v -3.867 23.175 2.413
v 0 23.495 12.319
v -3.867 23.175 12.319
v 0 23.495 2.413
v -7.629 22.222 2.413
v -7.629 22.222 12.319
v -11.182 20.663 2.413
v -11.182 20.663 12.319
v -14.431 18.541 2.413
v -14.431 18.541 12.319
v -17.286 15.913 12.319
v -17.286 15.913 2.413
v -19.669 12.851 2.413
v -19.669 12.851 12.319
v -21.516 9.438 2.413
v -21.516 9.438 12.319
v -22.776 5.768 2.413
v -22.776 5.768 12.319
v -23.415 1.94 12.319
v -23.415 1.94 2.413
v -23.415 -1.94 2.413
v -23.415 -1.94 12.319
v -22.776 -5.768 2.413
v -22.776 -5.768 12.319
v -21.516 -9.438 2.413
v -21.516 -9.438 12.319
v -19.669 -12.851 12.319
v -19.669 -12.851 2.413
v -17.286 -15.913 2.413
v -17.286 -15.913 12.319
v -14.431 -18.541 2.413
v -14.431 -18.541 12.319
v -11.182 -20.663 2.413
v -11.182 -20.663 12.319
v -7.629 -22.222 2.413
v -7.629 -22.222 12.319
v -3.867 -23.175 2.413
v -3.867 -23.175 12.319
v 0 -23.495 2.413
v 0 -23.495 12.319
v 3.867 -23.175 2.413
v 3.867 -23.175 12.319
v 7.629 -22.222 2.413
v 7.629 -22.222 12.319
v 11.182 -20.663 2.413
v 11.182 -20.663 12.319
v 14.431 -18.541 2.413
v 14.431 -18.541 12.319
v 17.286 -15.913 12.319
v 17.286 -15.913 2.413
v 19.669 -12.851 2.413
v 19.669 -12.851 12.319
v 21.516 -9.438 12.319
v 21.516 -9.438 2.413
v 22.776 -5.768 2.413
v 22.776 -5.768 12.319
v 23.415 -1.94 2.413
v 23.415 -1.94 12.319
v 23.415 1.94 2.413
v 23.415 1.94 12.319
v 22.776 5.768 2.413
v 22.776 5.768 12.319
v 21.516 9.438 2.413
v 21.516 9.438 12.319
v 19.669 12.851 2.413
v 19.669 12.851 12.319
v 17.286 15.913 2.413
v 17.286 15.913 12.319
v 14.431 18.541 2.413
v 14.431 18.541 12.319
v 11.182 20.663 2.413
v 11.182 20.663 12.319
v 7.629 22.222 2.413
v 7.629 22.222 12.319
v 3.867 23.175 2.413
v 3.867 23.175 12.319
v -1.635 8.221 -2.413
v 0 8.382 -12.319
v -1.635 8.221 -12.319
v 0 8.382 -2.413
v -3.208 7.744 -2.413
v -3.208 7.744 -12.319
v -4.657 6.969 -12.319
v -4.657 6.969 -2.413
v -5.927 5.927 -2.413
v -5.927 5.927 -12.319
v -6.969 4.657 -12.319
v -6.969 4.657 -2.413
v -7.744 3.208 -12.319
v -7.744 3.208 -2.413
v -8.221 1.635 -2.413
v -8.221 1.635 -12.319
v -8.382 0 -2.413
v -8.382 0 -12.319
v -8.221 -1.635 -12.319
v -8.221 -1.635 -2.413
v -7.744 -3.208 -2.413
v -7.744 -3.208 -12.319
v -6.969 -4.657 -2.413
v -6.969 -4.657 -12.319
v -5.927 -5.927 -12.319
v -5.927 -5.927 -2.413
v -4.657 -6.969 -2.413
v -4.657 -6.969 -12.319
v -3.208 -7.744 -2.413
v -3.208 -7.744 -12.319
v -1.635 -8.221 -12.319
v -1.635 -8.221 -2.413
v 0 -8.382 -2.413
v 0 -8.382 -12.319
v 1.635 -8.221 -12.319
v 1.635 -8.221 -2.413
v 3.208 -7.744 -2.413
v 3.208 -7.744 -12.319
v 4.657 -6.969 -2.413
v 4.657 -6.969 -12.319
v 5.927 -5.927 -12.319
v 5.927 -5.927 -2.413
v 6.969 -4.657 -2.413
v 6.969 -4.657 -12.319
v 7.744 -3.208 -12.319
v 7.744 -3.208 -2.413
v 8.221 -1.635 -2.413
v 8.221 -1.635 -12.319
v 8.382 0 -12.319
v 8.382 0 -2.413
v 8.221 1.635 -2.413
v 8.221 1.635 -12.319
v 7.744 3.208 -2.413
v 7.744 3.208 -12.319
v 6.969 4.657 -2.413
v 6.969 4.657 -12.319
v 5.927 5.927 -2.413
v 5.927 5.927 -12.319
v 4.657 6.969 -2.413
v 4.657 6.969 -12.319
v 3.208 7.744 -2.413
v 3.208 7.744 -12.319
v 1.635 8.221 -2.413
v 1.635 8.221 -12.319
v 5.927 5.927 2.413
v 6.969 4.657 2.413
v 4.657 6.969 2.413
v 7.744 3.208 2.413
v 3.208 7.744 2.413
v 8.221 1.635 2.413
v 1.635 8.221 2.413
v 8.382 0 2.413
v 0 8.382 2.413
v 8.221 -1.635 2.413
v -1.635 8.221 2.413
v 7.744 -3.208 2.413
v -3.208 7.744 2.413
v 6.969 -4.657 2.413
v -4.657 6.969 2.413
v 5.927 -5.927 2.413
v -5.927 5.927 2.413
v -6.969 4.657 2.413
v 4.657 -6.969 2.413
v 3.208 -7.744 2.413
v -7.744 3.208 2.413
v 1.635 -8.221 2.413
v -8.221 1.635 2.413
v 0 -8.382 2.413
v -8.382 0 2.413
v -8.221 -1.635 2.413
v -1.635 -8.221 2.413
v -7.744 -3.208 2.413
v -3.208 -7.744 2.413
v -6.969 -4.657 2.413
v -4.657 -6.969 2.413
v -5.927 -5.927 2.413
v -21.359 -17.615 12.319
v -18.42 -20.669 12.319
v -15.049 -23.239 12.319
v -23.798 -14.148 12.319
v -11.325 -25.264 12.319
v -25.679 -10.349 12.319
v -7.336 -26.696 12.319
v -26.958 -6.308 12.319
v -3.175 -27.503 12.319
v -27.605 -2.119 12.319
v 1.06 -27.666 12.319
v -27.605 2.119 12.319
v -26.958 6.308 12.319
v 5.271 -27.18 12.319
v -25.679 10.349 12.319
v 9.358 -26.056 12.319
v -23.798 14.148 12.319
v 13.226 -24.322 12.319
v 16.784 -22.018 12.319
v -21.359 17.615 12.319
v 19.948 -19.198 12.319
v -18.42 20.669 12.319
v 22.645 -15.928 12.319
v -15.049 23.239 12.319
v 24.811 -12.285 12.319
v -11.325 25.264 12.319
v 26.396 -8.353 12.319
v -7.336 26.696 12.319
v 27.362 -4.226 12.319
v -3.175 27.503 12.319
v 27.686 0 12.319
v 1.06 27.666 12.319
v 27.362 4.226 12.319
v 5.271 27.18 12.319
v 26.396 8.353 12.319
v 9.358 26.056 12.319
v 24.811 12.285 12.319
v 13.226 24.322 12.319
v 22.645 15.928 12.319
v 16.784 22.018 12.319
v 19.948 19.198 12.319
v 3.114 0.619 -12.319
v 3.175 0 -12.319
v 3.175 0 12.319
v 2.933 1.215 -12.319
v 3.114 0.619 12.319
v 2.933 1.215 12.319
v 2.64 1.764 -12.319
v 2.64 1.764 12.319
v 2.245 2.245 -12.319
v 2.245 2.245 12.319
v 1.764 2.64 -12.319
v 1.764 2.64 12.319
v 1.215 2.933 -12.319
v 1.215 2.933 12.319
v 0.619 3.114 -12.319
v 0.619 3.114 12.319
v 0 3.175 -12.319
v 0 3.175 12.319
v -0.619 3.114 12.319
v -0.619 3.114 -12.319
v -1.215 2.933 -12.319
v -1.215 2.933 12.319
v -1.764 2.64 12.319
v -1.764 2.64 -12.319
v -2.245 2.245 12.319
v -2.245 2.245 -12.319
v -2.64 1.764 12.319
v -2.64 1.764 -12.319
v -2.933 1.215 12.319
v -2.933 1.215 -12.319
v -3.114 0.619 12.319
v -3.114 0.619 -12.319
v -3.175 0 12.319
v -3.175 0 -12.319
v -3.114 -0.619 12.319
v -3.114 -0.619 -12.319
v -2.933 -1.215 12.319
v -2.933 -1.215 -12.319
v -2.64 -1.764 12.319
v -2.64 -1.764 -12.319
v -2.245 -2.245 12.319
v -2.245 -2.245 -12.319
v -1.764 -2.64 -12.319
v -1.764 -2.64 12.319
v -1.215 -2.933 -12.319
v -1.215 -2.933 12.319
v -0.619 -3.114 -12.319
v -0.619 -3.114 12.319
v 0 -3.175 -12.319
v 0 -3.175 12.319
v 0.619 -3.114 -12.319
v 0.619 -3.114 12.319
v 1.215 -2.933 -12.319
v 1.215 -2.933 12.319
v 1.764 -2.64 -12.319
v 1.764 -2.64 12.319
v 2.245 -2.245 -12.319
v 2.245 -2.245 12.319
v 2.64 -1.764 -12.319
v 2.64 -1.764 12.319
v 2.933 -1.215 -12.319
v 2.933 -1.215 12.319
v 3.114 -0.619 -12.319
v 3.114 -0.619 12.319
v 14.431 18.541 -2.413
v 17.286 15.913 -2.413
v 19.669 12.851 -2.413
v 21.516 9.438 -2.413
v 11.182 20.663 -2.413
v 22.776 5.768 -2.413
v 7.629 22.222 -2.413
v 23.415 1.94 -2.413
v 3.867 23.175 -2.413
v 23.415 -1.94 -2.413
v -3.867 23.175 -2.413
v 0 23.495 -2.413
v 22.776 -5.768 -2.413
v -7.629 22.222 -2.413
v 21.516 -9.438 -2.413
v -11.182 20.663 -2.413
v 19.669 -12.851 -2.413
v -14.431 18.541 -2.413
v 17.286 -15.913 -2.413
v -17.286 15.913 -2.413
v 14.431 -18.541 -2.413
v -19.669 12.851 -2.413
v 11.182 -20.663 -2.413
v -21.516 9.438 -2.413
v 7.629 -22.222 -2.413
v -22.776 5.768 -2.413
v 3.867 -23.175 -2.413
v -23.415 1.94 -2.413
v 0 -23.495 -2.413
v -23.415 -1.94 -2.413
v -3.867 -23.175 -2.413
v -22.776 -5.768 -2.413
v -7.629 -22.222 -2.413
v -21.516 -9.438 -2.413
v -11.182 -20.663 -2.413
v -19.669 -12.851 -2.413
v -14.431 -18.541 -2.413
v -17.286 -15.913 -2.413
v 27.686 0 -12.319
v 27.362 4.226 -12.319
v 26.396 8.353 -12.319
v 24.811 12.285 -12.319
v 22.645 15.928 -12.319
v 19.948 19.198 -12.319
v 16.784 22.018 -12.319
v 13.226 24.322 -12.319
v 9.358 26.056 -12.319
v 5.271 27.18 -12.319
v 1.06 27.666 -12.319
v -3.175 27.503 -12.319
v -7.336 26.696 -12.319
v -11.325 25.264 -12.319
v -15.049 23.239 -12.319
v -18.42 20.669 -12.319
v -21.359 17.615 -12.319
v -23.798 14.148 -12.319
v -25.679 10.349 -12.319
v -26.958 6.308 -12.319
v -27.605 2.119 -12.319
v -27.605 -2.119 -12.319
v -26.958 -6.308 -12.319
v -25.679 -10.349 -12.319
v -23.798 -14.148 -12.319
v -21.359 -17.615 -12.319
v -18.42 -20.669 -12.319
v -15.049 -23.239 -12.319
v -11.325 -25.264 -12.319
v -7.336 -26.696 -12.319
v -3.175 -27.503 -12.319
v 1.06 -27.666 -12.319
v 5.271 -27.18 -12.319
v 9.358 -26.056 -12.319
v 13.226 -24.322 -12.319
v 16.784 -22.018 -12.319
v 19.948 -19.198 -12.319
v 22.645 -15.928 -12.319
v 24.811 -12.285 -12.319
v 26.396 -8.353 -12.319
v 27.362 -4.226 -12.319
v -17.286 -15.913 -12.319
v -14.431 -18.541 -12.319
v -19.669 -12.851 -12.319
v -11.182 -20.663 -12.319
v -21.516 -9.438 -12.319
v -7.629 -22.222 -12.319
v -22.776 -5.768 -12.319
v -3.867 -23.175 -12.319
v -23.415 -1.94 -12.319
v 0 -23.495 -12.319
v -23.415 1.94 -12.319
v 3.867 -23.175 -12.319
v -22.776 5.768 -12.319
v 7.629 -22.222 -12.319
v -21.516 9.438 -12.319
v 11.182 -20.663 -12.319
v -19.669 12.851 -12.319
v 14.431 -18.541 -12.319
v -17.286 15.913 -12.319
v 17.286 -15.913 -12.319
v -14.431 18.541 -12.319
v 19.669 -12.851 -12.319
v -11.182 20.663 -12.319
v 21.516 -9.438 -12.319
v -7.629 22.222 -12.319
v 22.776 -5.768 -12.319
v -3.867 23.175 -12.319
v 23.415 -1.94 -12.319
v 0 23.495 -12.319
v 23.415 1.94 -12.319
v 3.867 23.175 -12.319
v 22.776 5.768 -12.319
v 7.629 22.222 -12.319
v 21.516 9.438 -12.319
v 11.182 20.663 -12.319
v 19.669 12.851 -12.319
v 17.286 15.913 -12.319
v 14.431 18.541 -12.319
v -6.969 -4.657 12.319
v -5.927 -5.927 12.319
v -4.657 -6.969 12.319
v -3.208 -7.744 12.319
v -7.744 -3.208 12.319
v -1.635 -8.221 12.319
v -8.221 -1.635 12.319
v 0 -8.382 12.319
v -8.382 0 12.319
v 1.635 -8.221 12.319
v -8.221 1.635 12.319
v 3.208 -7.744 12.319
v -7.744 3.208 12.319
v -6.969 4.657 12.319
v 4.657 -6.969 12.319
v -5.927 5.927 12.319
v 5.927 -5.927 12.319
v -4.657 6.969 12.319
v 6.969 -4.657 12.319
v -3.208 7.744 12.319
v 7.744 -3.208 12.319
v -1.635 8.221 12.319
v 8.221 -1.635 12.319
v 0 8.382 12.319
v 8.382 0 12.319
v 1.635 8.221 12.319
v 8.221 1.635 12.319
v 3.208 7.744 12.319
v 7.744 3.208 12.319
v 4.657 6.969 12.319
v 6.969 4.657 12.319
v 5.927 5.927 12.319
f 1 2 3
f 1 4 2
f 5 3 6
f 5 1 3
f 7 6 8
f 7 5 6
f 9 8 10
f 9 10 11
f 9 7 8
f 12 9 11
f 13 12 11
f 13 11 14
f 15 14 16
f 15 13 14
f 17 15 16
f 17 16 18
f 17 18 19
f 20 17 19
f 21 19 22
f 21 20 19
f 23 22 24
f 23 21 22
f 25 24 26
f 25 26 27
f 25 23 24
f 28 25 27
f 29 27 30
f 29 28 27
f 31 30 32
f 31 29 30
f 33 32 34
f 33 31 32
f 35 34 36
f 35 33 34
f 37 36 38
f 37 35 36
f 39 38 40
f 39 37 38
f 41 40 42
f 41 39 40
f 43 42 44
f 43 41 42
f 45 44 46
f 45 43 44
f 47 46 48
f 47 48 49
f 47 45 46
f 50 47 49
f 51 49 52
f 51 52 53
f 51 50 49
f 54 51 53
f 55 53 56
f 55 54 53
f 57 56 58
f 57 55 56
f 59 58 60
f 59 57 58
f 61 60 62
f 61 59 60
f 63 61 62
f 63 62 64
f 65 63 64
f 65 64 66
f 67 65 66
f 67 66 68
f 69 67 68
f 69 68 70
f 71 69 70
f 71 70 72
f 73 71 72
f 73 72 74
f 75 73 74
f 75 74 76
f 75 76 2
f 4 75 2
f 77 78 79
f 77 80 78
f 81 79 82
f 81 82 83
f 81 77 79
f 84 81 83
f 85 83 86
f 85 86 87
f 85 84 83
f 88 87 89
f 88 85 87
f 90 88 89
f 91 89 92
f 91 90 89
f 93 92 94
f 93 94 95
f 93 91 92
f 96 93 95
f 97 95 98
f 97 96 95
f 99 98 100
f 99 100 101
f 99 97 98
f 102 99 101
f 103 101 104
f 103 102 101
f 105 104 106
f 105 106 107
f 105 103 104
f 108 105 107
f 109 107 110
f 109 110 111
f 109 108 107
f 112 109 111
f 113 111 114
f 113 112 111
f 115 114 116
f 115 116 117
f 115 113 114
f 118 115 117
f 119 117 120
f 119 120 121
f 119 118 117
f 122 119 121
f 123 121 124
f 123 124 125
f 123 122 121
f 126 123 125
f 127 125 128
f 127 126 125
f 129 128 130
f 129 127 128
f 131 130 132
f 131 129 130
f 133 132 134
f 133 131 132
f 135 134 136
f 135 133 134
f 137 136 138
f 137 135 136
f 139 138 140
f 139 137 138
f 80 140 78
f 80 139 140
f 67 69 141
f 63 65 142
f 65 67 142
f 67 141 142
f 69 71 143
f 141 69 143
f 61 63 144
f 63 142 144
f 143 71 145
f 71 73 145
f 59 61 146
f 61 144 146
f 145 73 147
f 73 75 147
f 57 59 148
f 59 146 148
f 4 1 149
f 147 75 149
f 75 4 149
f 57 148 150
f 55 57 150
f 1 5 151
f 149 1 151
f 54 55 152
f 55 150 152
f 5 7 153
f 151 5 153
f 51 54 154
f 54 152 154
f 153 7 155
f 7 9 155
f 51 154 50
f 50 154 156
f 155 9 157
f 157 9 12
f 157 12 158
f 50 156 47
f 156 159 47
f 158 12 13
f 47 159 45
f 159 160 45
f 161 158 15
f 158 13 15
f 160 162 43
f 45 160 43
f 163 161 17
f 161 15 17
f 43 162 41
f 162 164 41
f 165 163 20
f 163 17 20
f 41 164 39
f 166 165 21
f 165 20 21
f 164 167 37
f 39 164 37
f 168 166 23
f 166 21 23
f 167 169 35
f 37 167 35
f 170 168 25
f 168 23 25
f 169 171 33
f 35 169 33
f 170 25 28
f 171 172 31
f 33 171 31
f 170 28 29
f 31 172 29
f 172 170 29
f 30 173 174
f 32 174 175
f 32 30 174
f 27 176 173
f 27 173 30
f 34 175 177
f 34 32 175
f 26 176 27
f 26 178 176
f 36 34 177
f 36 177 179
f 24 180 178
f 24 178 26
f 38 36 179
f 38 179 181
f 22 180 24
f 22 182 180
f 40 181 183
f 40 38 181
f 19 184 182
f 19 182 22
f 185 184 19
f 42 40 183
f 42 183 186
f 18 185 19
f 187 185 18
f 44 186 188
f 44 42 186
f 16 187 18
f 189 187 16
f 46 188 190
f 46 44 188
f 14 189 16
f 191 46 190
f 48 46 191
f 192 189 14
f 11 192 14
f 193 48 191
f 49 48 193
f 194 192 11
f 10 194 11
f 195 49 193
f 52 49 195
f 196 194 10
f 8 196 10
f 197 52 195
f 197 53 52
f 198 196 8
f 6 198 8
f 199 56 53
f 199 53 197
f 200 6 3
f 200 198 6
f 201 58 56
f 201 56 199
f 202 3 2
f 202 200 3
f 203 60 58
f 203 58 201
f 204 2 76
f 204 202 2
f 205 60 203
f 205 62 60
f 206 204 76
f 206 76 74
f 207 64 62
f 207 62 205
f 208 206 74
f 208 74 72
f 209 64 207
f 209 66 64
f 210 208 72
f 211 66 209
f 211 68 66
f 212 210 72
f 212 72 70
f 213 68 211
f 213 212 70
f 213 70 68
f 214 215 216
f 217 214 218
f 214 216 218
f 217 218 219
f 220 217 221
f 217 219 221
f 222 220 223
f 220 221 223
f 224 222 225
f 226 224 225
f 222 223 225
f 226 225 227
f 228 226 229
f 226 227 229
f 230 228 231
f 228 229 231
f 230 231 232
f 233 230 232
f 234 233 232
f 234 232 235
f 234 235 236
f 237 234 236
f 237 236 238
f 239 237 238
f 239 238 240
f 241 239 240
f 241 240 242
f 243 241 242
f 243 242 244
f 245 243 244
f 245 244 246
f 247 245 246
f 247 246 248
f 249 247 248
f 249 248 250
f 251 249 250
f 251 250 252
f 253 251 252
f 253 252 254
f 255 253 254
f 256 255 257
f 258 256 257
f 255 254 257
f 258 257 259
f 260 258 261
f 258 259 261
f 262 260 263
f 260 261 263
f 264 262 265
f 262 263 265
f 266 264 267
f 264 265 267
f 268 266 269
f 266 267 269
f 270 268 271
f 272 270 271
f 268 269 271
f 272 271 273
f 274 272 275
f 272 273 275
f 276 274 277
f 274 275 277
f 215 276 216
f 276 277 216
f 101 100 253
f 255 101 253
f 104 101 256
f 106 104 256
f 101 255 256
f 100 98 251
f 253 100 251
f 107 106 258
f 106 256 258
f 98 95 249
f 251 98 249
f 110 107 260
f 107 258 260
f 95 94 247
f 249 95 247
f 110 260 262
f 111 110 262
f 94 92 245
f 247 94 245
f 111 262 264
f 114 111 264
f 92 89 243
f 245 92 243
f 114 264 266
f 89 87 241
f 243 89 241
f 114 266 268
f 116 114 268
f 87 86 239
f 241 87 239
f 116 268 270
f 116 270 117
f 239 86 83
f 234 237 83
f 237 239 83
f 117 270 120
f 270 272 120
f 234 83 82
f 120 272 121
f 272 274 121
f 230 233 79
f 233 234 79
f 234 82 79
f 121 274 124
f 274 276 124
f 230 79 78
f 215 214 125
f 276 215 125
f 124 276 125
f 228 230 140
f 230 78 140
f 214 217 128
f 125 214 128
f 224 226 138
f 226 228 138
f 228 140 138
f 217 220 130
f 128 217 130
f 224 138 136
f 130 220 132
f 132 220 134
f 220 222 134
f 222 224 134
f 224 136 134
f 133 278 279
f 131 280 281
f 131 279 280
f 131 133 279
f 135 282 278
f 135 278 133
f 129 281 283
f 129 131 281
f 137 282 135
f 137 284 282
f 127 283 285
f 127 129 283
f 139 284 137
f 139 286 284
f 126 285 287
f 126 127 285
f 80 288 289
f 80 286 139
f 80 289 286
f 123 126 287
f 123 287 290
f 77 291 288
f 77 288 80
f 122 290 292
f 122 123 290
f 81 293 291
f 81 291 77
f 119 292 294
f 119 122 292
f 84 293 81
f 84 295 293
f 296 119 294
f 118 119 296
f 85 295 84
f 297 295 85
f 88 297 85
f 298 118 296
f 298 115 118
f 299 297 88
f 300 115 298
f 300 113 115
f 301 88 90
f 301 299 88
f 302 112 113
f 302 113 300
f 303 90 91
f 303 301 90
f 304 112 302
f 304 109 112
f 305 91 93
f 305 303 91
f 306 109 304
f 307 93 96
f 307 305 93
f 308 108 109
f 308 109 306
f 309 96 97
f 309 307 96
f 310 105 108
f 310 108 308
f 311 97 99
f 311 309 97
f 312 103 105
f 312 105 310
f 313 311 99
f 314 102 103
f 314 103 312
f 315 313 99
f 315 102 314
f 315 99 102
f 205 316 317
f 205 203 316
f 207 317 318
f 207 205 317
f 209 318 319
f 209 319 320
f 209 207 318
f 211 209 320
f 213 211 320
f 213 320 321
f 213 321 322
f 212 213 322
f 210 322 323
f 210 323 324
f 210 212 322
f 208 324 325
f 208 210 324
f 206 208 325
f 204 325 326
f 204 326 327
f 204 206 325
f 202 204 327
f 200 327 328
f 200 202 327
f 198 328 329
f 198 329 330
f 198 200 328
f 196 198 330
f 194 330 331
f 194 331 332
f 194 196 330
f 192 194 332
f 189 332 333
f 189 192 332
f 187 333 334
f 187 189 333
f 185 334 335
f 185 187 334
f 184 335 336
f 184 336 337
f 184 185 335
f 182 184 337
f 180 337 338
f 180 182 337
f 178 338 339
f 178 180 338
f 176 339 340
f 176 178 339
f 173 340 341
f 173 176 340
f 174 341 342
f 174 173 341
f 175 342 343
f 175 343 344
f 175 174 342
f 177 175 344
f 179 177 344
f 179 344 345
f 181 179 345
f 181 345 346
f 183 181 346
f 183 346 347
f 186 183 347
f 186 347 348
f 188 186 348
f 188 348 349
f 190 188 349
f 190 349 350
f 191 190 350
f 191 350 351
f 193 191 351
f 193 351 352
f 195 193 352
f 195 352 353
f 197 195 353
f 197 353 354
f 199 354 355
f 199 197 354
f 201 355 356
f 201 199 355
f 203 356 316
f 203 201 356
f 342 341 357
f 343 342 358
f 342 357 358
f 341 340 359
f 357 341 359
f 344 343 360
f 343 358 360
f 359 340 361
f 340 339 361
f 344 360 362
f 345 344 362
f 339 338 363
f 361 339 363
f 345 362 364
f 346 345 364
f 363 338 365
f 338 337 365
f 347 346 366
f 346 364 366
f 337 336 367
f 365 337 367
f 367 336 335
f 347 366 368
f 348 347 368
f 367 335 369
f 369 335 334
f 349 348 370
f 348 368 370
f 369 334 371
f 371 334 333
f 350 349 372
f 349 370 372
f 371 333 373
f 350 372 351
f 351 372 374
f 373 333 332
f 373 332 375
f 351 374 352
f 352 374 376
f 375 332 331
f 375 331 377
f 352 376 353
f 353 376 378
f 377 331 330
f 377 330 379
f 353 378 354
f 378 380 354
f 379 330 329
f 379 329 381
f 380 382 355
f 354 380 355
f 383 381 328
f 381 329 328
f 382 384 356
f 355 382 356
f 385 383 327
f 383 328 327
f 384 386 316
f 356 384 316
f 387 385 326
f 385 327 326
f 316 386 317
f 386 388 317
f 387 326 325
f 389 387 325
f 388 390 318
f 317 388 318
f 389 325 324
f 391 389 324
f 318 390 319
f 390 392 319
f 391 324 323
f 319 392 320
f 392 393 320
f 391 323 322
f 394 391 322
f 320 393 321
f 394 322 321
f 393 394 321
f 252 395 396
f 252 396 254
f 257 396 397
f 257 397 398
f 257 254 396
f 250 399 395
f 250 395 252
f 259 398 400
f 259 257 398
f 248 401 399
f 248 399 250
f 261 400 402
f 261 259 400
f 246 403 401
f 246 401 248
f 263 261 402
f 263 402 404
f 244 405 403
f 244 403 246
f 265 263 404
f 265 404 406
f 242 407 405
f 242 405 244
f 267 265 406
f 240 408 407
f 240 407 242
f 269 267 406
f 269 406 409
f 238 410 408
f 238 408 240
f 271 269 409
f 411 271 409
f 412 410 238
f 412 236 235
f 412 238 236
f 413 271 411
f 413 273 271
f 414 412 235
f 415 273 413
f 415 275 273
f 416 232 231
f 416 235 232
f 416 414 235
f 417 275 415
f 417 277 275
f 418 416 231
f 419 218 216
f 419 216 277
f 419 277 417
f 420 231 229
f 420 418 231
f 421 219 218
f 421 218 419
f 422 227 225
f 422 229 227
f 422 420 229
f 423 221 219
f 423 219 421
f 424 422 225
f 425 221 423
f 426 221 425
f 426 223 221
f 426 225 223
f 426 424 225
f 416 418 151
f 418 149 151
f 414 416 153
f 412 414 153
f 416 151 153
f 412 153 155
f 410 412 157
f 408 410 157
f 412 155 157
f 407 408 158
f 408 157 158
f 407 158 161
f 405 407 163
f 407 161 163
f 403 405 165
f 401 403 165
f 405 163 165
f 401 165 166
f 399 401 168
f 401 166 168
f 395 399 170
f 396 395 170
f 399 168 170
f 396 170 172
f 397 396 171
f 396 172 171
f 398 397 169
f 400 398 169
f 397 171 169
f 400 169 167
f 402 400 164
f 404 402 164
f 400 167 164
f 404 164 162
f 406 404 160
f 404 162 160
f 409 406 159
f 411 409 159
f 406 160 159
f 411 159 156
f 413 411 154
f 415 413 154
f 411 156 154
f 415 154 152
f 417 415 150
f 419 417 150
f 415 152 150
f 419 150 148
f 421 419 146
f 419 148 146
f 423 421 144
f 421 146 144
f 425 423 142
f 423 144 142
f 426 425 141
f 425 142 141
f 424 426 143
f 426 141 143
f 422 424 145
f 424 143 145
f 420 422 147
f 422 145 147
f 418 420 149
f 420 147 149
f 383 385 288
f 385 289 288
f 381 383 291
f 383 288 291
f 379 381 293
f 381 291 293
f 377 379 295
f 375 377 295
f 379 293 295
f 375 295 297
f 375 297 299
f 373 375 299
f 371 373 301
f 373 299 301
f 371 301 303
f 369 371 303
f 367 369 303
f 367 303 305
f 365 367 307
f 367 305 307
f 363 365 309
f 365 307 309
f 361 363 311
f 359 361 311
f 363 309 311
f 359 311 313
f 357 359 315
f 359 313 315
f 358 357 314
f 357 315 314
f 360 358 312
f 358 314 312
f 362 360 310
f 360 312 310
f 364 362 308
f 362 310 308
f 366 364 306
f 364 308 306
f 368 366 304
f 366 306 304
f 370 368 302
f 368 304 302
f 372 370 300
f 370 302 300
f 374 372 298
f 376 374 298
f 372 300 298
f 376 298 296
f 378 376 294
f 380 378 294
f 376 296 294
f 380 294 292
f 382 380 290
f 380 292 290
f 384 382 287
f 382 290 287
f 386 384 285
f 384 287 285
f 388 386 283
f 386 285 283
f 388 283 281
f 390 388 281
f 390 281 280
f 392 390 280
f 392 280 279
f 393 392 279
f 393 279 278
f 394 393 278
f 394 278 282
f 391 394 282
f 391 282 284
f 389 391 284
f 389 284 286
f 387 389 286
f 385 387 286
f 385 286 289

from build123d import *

# Parameters (mm, degrees)
SKETCH1_R           = 27.686
BOSS_EXTRUDE1_DEPTH = 12.319
SKETCH2_W           = 9.906
SKETCH2_H           = 15.113
SKETCH3_R           = 3.175
CUT_EXTRUDE1_DEPTH  = 25.638


with BuildPart() as part:
    # Sketch1 → Boss-Extrude1 (new body, symmetric)
    with BuildSketch(Plane.XY):
        Circle(SKETCH1_R)
    extrude(amount=BOSS_EXTRUDE1_DEPTH, both=True)

    # Sketch2 → Cut-Revolve1 (revolve, cut)
    with BuildSketch(Plane(origin=(0, 0, 0), x_dir=(0, 0, -1), z_dir=(1, 0, 0))):
        with Locations((-7.366, 15.9385)):
            Rectangle(SKETCH2_W, SKETCH2_H)
    cut_revolve1 = revolve(axis=Axis((0, 0, 0), (0, 0, 1)), mode=Mode.SUBTRACT)

    # Sketch3 → Cut-Extrude1 (cut, through all)
    with BuildSketch(Plane.XY.offset(12.319)):
        Circle(SKETCH3_R)
    extrude(amount=-CUT_EXTRUDE1_DEPTH, mode=Mode.SUBTRACT)

    # Mirror1: Cut-Revolve1 across plane
    add(cut_revolve1.mirror(Plane.XY), mode=Mode.SUBTRACT)


solid = part.part
